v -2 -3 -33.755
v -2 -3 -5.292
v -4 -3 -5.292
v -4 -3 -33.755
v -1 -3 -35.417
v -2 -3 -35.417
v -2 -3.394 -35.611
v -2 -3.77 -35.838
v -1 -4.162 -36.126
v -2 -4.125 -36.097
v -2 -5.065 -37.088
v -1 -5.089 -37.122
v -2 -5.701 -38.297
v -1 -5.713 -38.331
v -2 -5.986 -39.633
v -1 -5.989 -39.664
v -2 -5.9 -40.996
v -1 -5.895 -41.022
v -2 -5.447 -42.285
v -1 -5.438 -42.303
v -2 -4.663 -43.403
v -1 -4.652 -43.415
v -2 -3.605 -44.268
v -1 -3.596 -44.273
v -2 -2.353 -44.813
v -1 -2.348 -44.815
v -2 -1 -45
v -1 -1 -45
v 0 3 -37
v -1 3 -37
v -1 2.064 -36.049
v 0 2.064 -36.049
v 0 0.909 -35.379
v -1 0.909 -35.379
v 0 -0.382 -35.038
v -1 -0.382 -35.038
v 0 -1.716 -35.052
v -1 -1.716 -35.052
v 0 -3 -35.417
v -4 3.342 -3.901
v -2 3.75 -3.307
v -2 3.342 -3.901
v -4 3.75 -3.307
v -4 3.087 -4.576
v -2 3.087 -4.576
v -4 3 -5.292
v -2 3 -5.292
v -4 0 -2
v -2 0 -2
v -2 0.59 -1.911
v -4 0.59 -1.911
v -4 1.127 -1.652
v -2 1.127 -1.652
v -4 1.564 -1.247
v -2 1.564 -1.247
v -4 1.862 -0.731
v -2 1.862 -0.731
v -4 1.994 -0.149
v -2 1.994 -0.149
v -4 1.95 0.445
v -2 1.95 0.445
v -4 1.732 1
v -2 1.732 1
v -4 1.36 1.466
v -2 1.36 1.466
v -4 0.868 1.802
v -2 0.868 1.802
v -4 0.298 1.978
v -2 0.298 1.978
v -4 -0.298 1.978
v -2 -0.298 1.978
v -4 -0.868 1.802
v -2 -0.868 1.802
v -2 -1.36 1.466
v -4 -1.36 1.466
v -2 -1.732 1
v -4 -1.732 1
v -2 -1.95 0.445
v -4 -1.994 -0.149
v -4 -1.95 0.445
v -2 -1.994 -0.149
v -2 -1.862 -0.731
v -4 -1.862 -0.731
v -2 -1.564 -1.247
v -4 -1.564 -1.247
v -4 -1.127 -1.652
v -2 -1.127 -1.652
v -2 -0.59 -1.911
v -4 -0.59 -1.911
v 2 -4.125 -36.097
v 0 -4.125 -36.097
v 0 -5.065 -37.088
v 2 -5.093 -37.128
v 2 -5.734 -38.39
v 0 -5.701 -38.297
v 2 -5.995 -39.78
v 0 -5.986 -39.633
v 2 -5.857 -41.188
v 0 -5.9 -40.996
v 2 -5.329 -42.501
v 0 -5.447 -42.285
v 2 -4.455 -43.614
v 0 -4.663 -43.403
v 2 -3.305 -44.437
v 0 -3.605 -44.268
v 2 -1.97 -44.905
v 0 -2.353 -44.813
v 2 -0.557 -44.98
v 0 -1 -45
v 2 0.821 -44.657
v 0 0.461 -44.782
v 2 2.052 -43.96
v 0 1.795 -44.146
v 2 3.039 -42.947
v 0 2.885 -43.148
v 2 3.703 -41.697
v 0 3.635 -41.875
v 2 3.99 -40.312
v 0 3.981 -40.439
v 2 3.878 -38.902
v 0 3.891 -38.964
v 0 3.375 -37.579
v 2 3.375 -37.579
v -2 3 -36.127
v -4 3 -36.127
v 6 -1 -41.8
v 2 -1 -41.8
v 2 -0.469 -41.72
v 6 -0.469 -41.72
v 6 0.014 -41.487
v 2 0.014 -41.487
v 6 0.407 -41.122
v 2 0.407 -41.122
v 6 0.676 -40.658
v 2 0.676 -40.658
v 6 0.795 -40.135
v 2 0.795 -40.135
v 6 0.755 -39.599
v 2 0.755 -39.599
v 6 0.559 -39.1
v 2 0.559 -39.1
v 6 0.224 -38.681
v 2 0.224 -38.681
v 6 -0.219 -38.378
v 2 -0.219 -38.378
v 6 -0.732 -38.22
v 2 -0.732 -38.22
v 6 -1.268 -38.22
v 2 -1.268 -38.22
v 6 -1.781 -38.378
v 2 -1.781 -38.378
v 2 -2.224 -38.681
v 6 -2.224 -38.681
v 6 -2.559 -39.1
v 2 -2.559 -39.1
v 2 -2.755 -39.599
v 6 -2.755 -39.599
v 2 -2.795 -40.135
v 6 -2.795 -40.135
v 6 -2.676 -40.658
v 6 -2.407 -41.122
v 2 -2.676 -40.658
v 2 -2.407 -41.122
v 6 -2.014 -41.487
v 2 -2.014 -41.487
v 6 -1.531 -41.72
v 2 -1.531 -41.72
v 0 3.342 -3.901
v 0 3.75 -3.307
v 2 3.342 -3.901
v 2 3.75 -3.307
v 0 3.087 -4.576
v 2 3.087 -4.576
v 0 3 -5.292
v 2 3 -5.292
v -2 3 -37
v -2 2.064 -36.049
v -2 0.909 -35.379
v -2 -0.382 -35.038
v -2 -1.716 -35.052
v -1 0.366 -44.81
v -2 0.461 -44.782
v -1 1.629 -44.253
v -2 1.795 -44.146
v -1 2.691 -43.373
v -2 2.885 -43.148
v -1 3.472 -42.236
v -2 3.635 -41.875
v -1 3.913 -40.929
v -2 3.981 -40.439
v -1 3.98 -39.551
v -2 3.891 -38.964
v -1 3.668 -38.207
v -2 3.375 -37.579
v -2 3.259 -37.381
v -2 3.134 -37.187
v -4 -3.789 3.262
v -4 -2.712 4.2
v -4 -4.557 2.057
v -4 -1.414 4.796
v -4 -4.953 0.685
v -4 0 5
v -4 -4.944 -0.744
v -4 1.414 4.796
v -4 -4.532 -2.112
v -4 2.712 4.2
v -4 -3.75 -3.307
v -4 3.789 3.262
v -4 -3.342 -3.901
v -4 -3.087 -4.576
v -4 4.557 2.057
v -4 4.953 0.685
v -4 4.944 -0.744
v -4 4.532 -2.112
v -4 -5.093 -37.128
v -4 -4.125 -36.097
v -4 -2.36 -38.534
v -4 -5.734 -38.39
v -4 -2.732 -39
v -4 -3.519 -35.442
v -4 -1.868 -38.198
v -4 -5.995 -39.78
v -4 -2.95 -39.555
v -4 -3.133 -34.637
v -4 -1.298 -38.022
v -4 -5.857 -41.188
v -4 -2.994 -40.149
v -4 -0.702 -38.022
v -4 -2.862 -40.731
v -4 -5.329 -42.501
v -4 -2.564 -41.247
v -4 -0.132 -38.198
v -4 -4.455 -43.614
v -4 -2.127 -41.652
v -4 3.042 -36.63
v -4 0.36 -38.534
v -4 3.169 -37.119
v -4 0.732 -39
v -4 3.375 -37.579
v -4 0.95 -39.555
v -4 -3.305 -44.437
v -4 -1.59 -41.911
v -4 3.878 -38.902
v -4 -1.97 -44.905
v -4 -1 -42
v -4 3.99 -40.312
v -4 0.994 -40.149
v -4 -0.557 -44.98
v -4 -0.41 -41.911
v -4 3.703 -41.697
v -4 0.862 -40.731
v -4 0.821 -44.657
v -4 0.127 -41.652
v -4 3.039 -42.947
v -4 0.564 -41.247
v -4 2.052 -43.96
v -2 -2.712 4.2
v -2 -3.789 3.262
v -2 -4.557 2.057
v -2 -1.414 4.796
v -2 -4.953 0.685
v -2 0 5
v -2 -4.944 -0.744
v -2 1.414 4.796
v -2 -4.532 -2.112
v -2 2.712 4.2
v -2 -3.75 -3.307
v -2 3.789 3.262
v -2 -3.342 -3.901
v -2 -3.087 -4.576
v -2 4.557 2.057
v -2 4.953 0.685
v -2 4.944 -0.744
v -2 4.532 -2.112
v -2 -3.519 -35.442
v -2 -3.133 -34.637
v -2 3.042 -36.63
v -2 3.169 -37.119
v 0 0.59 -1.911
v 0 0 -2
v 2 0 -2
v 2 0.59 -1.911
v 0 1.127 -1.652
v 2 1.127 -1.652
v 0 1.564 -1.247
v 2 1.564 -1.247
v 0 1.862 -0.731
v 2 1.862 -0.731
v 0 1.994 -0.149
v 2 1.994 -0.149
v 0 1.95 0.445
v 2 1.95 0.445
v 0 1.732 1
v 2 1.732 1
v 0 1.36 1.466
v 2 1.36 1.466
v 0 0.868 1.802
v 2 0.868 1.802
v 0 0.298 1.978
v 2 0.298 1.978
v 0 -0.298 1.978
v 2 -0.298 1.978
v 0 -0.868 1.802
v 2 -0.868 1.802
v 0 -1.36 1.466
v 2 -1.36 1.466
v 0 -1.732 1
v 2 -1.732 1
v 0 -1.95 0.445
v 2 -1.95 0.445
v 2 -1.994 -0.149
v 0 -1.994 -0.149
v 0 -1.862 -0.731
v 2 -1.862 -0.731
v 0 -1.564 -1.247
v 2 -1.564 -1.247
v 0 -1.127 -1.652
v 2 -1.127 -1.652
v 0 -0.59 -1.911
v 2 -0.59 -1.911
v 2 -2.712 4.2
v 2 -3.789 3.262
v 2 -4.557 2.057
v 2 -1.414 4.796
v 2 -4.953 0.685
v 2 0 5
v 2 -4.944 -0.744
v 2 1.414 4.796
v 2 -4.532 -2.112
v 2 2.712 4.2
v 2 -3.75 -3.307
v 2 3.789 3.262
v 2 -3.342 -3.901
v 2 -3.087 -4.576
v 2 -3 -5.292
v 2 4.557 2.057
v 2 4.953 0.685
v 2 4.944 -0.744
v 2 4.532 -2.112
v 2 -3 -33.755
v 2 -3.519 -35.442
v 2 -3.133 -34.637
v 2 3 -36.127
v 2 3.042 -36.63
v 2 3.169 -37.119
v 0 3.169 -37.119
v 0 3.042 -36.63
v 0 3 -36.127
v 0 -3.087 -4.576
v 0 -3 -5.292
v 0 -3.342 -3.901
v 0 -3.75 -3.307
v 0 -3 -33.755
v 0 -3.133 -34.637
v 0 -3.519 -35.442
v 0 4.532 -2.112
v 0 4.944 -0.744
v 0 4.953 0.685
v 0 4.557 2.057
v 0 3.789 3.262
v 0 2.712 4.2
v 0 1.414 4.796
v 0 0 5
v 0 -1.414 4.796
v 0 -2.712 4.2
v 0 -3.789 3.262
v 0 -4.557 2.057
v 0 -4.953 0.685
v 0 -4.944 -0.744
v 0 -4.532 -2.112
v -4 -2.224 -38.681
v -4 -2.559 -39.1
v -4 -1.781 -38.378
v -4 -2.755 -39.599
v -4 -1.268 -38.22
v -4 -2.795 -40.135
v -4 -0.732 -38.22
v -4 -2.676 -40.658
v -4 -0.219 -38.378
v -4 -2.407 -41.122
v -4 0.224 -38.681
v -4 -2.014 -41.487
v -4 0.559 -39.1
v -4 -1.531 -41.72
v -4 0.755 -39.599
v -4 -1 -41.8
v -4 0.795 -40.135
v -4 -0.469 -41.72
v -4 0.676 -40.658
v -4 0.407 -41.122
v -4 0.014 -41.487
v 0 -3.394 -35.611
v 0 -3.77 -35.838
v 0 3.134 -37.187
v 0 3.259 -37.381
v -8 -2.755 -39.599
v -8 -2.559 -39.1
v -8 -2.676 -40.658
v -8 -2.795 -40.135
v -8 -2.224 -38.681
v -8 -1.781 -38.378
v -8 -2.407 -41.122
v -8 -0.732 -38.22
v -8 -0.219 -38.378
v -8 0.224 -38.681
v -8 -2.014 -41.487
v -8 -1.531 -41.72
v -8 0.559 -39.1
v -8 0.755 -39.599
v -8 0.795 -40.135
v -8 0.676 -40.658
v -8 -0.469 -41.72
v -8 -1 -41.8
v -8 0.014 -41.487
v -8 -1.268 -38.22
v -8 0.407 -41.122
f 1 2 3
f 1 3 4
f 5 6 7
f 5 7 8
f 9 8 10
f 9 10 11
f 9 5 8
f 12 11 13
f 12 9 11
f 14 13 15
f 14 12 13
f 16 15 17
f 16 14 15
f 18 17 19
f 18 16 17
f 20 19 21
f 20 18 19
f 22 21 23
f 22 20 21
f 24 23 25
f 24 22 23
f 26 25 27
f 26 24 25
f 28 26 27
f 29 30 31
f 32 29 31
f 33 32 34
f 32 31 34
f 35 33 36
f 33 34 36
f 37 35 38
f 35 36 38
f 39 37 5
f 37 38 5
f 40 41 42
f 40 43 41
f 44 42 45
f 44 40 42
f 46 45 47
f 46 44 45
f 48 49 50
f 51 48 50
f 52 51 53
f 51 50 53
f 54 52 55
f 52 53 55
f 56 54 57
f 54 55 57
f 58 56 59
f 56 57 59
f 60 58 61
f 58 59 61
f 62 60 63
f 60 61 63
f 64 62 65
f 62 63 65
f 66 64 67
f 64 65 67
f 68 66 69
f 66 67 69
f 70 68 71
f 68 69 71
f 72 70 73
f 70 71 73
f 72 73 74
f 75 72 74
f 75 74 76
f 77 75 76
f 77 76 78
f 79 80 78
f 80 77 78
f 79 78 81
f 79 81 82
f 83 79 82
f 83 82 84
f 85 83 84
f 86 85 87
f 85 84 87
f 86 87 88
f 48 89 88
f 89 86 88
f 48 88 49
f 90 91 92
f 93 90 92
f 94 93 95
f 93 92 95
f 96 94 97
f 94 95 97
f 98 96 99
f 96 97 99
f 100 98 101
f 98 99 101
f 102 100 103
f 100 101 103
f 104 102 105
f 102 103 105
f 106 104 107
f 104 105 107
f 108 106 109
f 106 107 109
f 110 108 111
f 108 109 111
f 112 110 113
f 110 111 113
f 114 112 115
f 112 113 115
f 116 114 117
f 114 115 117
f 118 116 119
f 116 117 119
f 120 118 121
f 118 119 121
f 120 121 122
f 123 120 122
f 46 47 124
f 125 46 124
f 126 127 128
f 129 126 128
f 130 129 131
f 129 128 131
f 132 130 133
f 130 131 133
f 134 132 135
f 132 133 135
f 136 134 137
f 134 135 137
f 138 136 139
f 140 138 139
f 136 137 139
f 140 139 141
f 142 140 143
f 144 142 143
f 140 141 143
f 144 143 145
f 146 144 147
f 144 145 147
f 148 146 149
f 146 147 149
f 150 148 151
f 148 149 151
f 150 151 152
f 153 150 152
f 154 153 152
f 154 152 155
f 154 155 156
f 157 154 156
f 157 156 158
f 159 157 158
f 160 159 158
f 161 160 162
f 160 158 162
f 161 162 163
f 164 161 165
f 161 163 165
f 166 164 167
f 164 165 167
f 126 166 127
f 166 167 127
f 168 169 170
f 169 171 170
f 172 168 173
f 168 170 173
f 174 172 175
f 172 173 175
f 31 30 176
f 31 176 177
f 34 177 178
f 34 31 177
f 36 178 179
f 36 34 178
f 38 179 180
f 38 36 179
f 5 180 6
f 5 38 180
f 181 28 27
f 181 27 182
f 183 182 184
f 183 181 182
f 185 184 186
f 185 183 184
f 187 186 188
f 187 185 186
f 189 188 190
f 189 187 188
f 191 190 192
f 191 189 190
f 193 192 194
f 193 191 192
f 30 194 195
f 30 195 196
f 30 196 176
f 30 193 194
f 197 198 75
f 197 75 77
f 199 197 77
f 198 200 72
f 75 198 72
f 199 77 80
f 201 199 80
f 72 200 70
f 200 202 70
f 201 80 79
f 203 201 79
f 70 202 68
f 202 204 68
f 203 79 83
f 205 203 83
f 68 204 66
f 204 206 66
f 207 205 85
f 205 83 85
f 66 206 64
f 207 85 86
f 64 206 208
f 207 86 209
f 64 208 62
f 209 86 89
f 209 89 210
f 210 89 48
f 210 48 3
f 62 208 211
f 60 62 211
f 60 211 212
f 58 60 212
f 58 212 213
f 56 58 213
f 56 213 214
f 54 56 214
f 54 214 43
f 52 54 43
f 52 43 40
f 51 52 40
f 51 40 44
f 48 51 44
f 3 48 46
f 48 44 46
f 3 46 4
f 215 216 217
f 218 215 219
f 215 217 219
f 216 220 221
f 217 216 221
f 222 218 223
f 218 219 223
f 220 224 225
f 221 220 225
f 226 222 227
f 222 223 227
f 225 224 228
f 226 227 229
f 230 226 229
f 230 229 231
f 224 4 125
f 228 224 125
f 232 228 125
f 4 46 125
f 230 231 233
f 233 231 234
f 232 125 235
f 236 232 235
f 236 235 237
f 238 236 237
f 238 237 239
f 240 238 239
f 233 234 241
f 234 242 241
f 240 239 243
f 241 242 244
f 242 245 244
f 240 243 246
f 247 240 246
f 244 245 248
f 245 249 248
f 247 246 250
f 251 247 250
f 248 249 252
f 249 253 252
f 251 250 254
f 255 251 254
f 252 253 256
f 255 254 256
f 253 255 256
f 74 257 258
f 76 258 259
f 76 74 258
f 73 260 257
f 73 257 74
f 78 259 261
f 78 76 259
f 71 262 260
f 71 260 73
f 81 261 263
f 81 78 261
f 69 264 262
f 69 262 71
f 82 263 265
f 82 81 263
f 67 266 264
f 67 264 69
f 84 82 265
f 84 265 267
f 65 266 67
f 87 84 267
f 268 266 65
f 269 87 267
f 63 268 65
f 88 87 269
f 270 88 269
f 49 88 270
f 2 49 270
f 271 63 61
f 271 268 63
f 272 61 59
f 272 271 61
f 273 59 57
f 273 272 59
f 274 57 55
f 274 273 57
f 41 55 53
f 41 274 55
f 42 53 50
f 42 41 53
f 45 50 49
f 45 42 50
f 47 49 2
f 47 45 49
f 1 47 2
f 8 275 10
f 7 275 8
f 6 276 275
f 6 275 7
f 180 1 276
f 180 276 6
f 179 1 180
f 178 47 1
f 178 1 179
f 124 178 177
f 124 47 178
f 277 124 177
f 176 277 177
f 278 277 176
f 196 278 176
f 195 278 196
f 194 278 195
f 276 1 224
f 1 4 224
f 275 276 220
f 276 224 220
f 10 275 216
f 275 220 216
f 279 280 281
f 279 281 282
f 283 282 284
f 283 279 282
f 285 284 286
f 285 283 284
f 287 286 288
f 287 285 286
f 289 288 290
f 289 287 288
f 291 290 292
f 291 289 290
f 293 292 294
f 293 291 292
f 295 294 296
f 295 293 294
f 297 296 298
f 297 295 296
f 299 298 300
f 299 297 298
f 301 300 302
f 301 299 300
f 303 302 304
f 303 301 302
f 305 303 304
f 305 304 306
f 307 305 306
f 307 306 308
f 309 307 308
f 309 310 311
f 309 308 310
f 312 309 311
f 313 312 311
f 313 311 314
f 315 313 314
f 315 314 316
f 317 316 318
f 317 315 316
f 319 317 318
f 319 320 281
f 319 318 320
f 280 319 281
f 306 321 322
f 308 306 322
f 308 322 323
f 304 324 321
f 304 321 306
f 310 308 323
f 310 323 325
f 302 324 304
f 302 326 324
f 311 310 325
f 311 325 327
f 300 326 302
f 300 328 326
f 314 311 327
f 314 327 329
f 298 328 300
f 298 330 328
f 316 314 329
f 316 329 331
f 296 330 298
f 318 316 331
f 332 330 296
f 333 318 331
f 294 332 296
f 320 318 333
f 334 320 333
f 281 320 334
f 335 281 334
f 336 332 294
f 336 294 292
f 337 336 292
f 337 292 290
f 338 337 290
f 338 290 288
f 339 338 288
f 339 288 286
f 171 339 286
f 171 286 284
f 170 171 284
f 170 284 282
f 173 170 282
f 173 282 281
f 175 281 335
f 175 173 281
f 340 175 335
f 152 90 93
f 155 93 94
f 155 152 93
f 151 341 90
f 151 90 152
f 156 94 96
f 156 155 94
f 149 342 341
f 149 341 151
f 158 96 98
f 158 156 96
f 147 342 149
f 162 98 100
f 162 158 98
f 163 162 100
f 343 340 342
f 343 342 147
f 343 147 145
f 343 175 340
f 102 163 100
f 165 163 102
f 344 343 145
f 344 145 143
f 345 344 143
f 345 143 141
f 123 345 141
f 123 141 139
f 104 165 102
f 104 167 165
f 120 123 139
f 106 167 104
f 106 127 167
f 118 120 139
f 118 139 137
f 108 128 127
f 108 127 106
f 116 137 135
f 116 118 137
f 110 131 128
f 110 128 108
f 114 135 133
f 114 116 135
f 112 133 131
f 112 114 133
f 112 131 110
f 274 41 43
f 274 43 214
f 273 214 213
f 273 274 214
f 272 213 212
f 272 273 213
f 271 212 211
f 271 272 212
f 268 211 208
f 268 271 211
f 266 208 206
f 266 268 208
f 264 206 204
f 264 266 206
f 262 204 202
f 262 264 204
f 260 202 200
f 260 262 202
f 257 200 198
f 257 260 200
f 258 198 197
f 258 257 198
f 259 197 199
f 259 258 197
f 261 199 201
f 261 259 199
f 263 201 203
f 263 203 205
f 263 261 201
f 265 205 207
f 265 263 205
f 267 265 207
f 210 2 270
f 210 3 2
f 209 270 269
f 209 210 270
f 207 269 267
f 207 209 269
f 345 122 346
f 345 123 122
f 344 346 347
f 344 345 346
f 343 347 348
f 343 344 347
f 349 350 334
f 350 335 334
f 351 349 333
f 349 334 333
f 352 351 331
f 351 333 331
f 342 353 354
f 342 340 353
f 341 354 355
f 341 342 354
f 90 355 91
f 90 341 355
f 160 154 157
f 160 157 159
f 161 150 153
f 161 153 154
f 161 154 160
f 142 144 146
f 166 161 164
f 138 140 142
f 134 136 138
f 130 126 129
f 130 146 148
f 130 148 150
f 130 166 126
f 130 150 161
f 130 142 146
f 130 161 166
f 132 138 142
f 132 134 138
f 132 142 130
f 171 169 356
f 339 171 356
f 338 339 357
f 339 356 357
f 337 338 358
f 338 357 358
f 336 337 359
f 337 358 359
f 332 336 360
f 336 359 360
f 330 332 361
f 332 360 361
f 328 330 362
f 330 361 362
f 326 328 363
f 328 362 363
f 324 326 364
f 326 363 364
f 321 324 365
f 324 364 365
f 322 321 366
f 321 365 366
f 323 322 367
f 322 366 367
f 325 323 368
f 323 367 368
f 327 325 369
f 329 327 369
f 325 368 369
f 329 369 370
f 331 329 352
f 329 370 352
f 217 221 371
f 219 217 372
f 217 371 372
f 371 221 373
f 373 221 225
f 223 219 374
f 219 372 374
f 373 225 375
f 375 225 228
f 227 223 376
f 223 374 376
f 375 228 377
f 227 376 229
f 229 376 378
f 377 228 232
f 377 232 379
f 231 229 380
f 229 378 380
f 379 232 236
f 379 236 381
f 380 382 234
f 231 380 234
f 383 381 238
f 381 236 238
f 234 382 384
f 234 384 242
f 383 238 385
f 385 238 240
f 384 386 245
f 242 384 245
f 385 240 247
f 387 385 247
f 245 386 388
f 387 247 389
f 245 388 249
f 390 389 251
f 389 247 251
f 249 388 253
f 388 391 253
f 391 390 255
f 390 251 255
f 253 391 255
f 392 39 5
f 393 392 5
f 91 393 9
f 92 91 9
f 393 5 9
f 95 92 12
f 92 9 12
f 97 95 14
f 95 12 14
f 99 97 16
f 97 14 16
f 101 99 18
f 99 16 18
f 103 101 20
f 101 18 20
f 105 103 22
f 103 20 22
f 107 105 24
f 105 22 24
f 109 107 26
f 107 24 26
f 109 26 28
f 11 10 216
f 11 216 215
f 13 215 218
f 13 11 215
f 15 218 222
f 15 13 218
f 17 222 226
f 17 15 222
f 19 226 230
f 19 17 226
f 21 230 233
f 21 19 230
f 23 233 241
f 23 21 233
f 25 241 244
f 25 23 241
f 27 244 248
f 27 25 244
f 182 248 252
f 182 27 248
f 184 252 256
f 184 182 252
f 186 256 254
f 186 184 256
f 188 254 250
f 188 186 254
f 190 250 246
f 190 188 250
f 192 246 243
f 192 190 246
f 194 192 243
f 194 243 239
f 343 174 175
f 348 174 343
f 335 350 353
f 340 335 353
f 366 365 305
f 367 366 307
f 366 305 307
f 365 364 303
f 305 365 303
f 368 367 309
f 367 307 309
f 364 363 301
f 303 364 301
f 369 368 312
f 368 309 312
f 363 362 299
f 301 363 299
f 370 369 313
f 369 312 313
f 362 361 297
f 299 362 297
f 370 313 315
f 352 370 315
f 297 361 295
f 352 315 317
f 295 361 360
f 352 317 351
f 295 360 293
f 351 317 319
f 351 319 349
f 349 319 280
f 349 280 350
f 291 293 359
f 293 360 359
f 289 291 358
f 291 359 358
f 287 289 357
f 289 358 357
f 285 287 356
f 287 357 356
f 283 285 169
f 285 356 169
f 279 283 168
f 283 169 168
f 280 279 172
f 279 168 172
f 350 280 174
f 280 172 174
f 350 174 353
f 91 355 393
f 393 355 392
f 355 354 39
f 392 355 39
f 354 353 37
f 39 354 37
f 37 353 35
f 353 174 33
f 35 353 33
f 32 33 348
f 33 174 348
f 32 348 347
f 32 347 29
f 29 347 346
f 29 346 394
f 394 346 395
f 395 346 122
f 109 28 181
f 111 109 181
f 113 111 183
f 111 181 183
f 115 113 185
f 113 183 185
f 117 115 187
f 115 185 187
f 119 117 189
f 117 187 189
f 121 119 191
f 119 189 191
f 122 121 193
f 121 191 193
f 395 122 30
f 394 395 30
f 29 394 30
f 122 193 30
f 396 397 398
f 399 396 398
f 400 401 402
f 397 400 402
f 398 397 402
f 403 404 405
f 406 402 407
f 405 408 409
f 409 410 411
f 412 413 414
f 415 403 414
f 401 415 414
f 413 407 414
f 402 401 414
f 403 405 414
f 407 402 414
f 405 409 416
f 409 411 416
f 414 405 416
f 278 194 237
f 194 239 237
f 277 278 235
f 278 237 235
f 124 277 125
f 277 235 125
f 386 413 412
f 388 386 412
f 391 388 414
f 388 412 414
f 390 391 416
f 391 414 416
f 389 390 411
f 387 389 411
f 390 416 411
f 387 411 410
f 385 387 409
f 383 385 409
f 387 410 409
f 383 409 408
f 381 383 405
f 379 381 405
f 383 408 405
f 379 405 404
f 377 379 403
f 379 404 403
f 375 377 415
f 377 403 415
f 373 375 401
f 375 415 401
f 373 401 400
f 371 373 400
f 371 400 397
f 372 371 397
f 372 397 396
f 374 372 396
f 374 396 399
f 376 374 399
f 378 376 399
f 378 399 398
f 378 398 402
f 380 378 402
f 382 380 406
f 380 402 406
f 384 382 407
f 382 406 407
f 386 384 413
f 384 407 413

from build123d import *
from build123d.topology import SkipClean

# Parameters (mm, degrees)
SKETCH_1_R               = 5
SKETCH_1_W               = 40
SKETCH_1_H               = 6
EXTRUDE_1_DEPTH          = 2
CUT_EXTRUDE_2_DEPTH      = 46.44227107
CUT_EXTRUDE_2_DEPTH_BACK = 46.44227107
SKETCH_1_3_R             = 2
FILLET_1_R               = 3
EXTRUDE_START            = -1
EXTRUDE_2_DEPTH          = 1
SKETCH_2_R               = 2
EXTRUDE_3_DEPTH          = 6
SKETCH_2_3_R             = 1.8
EXTRUDE_4_DEPTH          = 4
EXTRUDE_START_2          = -10
SKETCH_2_4_R             = 1.8
EXTRUDE_5_DEPTH          = 4


with BuildPart() as part:
    # 草图1 → 凸台-拉伸1 (new body)
    with BuildSketch(Plane(origin=(0, 0, 0), x_dir=(0, 0, -1), z_dir=(1, 0, 0))):
        Circle(SKETCH_1_R)
        with Locations((40, -1)):
            Circle(SKETCH_1_R)
        with Locations((20, 0)):
            Rectangle(SKETCH_1_W, SKETCH_1_H)
    extrude(amount=EXTRUDE_1_DEPTH)

    # 草图1<3> → 切除-拉伸2 (cut, two sides: drawn at the far end of the back side and taken through both)
    with BuildSketch(Plane(origin=(0, 0, 0), x_dir=(0, 0, -1), z_dir=(1, 0, 0)).offset(-CUT_EXTRUDE_2_DEPTH_BACK)):
        Circle(SKETCH_1_3_R)
        with Locations((40, -1)):
            Circle(SKETCH_1_3_R)
    extrude(amount=CUT_EXTRUDE_2_DEPTH + CUT_EXTRUDE_2_DEPTH_BACK, mode=Mode.SUBTRACT)

    # 圆角1
    fillet_1_edges = [part.edges().sort_by_distance(p)[0] for p in [
        (1, -3, -35.417424305),
        (1, 3, -37),
        (1, 3, -4),
        (1, -3, -4),
    ]]
    fillet(fillet_1_edges, radius=FILLET_1_R)

    # 草图1<4> → 凸台-拉伸2 (add)
    with SkipClean():  # the faces are left unmerged after this step: merging them gives an invalid solid
        with BuildSketch(Plane(origin=(0, 0, 0), x_dir=(0, 0, -1), z_dir=(1, 0, 0)).offset(EXTRUDE_START)):
            with BuildLine():
                ThreePointArc((37, 3), (35.16534763, 0.275200556), (35.417424305, -3))
                Line((35.417424305, -3), (40, -3))
                ThreePointArc((40, -3), (38, -1), (40, 1))
                Line((40, 1), (40, 3))
                Line((40, 3), (37, 3))
            make_face()
            with BuildLine():
                Line((40, -3), (35.417424305, -3))
                ThreePointArc((35.417424305, -3), (41.021548218, -5.894531565), (45, -1))
                ThreePointArc((45, -1), (42.236067977, 3.472135955), (37, 3))
                Line((37, 3), (40, 3))
                Line((40, 3), (40, 1))
                ThreePointArc((40, 1), (41.414213562, 0.414213562), (42, -1))
                ThreePointArc((42, -1), (41.414213562, -2.414213562), (40, -3))
            make_face()
        extrude(amount=EXTRUDE_2_DEPTH)

    # 镜向3: part across plane


with BuildPart() as part_1:
    add(part.part)
    add(part.part.mirror(Plane.ZY.offset(1)))

    # 草图2 → 凸台-拉伸3 (add)
    with BuildSketch(Plane(origin=(2, 0, 0), x_dir=(0, 0, -1), z_dir=(1, 0, 0))):
        with Locations((40, -1)):
            Circle(SKETCH_2_R)
    extrude(amount=-EXTRUDE_3_DEPTH)

    # 草图2<3> → 凸台-拉伸4 (add)
    with BuildSketch(Plane(origin=(2, 0, 0), x_dir=(0, 0, -1), z_dir=(1, 0, 0))):
        with Locations((40, -1)):
            Circle(SKETCH_2_3_R)
    extrude(amount=EXTRUDE_4_DEPTH)

    # 草图2<4> → 凸台-拉伸5 (add)
    with BuildSketch(Plane(origin=(2, 0, 0), x_dir=(0, 0, -1), z_dir=(1, 0, 0)).offset(EXTRUDE_START_2)):
        with Locations((40, -1)):
            Circle(SKETCH_2_4_R)
    extrude(amount=EXTRUDE_5_DEPTH)


solid = part_1.part
